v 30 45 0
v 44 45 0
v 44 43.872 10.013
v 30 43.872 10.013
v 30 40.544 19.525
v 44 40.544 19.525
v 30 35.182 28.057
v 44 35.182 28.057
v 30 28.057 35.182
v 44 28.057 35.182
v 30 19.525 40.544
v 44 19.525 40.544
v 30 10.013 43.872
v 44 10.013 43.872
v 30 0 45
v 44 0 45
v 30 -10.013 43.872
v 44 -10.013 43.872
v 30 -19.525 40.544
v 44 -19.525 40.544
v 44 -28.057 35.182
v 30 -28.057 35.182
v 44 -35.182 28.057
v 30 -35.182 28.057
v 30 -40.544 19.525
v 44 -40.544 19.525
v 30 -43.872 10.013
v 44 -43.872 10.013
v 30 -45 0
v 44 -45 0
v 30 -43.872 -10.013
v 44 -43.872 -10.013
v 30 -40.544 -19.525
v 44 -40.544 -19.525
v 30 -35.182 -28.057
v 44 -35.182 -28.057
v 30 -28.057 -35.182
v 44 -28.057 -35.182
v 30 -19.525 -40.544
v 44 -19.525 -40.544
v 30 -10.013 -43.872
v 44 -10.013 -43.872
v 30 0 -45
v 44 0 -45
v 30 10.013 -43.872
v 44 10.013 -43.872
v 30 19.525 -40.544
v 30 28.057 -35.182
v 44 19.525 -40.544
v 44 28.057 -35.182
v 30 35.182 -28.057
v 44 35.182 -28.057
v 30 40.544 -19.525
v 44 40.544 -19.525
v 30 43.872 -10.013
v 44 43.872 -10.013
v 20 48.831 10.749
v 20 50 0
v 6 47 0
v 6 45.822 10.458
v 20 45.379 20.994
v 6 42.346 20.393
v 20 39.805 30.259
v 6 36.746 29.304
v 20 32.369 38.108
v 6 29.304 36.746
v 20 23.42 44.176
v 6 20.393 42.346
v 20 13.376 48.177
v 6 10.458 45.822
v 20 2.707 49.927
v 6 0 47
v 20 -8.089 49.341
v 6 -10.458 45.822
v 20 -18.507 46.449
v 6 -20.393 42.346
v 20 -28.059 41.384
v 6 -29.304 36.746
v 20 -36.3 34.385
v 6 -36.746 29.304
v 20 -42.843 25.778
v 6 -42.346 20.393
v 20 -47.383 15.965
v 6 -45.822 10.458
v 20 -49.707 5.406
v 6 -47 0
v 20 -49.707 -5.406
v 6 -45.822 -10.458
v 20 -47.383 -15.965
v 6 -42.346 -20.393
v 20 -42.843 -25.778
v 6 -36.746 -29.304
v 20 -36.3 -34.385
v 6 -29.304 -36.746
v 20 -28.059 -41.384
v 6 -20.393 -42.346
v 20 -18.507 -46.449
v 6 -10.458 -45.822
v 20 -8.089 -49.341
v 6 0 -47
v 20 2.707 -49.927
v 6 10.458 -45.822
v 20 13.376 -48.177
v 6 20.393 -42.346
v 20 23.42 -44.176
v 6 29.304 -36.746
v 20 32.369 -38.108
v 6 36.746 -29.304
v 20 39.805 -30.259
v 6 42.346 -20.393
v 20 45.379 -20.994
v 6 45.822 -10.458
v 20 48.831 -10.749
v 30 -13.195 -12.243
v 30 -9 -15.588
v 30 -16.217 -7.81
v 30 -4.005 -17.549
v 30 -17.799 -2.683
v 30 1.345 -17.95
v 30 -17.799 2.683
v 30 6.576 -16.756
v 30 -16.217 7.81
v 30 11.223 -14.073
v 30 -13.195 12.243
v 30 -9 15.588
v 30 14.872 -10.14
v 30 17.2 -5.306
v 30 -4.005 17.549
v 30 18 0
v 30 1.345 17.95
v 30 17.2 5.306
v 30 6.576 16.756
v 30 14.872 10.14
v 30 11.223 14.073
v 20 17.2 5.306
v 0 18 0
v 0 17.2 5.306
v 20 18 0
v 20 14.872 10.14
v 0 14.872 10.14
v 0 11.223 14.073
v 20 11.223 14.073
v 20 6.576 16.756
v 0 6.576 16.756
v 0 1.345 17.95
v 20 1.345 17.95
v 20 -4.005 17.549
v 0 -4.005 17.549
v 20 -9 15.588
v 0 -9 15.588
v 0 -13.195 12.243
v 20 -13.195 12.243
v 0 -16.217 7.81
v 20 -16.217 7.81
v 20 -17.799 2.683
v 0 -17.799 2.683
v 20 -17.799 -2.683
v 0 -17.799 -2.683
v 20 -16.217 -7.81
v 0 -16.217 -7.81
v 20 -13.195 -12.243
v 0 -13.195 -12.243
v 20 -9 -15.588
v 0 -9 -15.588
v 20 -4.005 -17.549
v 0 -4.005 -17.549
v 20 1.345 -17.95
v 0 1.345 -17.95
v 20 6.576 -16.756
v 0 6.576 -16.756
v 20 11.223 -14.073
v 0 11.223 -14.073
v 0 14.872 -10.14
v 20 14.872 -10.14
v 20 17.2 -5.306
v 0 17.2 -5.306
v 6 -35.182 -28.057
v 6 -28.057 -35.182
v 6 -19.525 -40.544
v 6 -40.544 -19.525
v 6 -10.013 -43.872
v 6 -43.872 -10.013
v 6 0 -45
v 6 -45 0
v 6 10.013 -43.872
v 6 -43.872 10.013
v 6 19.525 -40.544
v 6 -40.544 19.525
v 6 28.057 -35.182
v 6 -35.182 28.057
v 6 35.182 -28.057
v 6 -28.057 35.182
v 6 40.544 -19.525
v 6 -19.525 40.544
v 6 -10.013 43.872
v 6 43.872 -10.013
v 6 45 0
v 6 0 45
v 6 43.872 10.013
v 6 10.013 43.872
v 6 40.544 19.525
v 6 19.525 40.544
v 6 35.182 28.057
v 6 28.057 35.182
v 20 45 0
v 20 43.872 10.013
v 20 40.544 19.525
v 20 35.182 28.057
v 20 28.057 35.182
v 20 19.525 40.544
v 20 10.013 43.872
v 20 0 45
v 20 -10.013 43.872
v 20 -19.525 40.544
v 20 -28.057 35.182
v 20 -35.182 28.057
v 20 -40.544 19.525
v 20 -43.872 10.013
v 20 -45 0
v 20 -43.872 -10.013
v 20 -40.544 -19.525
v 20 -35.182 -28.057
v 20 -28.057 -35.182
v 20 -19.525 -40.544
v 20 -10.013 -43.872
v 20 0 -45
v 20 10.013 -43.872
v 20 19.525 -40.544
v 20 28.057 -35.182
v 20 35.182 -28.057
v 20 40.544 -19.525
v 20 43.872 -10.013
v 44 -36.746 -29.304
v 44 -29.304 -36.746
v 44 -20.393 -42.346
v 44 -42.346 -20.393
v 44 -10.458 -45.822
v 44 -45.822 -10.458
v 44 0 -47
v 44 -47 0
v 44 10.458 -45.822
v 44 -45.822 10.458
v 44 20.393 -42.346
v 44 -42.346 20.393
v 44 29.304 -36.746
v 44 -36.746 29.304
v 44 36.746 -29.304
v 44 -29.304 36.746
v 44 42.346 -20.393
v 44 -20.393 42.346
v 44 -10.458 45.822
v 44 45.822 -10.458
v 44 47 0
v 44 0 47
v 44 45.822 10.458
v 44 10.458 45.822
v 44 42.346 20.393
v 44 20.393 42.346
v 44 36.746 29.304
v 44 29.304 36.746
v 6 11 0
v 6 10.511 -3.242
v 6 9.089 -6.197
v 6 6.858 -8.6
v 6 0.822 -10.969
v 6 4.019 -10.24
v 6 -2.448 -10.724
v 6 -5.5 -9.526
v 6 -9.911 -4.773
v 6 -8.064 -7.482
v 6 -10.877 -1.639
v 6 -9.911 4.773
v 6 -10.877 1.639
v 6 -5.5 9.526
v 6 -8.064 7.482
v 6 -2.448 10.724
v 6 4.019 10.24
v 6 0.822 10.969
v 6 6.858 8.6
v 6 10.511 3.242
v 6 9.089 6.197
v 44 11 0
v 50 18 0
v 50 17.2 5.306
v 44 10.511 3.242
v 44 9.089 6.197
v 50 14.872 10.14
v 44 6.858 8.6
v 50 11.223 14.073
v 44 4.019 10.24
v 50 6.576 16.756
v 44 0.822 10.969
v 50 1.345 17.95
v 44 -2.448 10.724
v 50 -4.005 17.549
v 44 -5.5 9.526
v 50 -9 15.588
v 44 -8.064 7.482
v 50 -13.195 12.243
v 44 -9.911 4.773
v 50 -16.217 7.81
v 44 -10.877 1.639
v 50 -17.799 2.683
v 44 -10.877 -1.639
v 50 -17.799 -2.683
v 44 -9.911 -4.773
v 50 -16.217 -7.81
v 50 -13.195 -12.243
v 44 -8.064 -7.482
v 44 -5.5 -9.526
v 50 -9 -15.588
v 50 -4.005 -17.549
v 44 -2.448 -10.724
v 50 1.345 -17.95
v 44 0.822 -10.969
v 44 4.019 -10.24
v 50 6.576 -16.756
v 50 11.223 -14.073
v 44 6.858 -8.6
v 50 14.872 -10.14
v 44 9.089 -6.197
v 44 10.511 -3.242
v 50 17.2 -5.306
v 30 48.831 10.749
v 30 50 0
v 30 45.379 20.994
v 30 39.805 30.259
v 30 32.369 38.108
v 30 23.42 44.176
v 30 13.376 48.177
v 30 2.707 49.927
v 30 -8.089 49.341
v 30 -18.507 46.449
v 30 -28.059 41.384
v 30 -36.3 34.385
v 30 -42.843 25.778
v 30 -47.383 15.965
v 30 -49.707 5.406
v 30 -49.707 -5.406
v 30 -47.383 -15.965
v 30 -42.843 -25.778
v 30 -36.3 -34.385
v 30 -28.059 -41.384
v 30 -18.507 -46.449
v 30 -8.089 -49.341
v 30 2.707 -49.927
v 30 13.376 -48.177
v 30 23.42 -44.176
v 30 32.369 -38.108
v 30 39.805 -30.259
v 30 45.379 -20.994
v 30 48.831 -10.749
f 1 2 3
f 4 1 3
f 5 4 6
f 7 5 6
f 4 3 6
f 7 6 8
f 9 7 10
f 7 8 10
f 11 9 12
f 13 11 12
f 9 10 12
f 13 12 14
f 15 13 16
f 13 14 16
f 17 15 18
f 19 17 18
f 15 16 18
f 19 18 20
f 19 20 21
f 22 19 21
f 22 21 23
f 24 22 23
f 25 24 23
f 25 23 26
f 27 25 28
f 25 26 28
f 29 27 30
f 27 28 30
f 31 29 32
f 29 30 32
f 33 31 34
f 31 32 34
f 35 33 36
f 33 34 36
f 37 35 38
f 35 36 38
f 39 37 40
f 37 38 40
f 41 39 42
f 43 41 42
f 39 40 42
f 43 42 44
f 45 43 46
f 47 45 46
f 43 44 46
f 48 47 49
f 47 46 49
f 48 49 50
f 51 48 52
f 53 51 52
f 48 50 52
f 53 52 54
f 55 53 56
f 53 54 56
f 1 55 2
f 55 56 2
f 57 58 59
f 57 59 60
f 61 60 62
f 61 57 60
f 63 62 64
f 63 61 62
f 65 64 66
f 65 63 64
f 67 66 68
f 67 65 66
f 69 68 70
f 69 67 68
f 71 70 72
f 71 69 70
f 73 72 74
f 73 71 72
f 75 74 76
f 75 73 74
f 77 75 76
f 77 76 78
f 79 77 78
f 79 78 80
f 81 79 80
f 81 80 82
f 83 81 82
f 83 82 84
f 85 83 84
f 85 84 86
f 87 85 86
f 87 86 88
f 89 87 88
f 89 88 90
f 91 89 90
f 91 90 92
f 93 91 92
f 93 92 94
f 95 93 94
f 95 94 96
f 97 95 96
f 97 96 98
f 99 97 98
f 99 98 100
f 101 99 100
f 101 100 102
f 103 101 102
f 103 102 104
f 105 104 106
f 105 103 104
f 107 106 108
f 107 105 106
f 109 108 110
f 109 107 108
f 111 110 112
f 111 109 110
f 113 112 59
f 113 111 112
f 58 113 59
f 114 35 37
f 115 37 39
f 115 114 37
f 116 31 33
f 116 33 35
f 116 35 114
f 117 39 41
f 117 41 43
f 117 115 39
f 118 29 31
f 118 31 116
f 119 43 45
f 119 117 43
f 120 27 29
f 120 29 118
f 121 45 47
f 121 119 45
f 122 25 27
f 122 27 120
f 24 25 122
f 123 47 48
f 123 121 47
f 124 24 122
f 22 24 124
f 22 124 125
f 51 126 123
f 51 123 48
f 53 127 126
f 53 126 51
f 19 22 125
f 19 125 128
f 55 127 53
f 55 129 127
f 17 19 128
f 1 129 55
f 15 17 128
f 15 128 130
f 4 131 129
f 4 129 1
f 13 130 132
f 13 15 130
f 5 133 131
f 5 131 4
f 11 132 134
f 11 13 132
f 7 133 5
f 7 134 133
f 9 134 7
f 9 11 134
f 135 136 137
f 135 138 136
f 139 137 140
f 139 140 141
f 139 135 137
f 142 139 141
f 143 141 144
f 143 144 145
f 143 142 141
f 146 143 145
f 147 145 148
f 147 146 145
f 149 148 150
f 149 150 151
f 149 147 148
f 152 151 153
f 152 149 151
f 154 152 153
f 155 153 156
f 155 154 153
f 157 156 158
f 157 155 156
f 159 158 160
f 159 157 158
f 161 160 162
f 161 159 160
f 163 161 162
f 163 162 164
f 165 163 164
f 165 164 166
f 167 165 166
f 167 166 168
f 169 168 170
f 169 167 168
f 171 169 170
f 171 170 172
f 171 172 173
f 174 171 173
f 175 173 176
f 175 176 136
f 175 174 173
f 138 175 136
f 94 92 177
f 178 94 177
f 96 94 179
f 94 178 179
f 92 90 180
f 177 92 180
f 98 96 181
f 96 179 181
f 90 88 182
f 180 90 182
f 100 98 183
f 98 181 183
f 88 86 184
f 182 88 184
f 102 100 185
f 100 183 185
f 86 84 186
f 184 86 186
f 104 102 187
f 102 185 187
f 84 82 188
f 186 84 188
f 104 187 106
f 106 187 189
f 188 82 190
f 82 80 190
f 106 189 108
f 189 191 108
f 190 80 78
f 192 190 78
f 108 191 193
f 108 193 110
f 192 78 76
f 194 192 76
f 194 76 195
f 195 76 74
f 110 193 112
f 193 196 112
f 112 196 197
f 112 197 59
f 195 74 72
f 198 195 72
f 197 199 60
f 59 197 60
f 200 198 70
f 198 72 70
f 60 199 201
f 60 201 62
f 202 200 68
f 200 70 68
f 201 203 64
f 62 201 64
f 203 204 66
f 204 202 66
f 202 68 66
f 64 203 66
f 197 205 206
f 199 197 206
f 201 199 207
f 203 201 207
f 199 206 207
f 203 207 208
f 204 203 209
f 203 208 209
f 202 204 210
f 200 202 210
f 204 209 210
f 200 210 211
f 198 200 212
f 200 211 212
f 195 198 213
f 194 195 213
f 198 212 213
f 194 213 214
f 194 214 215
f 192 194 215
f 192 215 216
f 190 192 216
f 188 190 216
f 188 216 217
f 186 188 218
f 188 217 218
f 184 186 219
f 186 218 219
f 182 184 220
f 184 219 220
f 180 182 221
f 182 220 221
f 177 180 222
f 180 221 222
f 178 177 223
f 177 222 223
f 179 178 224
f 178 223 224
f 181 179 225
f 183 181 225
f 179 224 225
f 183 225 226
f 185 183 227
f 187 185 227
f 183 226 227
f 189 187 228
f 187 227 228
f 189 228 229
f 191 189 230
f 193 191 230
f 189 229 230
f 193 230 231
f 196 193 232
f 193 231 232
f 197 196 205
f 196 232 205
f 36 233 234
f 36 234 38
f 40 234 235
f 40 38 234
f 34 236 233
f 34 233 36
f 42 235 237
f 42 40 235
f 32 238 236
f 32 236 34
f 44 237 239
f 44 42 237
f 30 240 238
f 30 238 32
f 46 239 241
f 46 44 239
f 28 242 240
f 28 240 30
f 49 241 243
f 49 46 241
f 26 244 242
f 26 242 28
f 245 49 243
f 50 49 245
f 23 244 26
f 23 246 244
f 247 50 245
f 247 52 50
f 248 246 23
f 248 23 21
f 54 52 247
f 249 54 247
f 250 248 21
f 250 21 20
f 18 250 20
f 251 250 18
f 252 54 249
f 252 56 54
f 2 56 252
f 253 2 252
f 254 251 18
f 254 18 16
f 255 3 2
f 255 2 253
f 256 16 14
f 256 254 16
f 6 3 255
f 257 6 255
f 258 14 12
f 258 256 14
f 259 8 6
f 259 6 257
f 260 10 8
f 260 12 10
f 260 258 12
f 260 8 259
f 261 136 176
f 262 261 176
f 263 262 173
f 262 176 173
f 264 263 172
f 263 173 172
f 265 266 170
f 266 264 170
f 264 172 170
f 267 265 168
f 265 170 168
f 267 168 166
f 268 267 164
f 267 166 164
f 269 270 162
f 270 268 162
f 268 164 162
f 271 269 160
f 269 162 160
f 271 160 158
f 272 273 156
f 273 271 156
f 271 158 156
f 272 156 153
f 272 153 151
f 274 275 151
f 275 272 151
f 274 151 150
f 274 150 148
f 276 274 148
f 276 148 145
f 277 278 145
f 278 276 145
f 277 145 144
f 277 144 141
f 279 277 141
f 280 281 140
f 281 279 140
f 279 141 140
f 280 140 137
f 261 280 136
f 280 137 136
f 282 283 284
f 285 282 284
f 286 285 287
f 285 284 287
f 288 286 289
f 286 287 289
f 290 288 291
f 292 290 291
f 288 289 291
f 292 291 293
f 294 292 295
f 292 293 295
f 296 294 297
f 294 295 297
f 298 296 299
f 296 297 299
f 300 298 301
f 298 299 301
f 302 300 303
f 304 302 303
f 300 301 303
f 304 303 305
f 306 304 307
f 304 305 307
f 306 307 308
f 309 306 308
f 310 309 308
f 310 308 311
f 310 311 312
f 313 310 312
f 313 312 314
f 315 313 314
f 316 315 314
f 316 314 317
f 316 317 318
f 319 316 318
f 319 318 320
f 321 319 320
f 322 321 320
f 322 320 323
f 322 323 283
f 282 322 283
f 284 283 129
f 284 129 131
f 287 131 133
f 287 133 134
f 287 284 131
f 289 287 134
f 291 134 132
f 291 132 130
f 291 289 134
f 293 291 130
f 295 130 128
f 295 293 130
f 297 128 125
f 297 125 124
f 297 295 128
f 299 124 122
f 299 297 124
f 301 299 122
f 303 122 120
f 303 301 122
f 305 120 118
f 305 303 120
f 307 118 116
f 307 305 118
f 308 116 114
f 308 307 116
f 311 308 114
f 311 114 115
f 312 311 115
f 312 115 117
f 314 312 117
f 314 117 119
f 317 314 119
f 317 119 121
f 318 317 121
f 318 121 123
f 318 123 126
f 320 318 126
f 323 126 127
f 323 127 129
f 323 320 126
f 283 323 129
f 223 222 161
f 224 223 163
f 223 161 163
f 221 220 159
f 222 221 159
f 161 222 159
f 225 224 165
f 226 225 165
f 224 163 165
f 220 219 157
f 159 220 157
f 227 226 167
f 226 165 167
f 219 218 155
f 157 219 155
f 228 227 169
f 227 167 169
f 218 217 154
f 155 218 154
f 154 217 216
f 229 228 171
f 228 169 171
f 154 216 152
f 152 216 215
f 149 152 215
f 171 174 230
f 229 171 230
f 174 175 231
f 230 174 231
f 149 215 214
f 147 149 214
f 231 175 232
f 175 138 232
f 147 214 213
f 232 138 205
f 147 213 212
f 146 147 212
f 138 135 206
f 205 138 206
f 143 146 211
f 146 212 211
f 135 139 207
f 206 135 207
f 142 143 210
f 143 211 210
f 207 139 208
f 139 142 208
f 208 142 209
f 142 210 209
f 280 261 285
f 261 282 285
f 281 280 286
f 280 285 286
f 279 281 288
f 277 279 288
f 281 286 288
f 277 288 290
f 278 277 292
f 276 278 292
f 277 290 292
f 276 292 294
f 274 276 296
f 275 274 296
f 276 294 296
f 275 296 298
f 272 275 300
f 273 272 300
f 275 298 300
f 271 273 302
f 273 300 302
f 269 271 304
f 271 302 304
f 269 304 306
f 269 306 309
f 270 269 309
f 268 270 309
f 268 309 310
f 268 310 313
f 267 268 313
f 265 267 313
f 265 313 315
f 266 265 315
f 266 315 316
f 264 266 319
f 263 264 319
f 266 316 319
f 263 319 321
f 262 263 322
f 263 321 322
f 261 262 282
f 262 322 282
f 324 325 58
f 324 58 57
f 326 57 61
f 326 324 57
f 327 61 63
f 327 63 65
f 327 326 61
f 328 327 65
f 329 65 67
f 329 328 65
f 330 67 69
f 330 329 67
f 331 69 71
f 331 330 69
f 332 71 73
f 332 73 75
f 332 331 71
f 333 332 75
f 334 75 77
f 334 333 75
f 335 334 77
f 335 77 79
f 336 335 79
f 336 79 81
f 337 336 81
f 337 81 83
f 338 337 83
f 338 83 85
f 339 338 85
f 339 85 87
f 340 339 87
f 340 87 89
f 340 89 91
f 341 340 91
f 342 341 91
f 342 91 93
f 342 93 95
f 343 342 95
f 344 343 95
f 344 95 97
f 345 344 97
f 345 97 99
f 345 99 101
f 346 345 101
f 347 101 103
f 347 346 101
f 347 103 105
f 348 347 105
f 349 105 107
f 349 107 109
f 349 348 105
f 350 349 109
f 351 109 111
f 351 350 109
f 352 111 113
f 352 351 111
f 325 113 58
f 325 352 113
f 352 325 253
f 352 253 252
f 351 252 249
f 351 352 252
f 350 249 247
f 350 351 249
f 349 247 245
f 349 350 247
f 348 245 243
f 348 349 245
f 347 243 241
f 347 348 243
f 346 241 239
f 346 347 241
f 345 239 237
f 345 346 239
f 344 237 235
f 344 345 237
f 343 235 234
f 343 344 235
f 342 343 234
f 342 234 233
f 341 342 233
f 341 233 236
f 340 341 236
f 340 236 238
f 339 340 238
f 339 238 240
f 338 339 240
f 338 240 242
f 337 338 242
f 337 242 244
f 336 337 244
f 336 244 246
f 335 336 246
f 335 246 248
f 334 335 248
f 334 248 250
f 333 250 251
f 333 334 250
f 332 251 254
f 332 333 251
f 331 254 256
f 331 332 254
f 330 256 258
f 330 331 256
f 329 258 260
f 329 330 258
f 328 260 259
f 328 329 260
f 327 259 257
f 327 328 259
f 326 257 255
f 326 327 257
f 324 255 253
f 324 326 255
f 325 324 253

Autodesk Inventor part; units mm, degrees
ref_plane "YZ Plane" through (0, 0, 0) normal (1, 0, 0) x (0, 1, 0)
ref_plane "XZ Plane" through (0, 0, 0) normal (0, 1, 0) x (-1, 0, 0)
ref_plane "XY Plane" through (0, 0, 0) normal (0, 0, 1) x (1, 0, 0)
sketch "Sketch1" plane through (0, 0, 0) normal (0, 0, 1) x (1, 0, 0)
  line L0 (0, 0) -> (50, 0)
  line L1 (6, 11) -> (44, 11)
  line L2 (20, 50) -> (30, 50)
  line L3 (20, 18) -> (20, 45)
  line L4 (30, 18) -> (30, 45)
  line L5 (0, 18) -> (20, 18)
  line L6 (30, 18) -> (50, 18)
  line L7 (44, 45) -> (44, 47)
  line L8 (6, 45) -> (6, 47)
  line L9 (44, 47) -> (30, 50)
  line L10 (20, 50) -> (6, 47)
  line L11 (6, 45) -> (20, 45)
  line L12 (30, 45) -> (44, 45)
  line L13 (50, 18) -> (44, 11)
  line L14 (6, 11) -> (0, 18)
  dimension "d0" = 50
  dimension "d2" = 38
  dimension "d3" = 11
  dimension "d4" = 39
  dimension "d8" = 10
  dimension "d9" = 20
  dimension "d12" = 2
  dimension "d13" = 2
  dimension "d14" = 18
  dimension "d15" = 26.2486
  dimension "d16" = 11.7142
  dimension "d17" = 18
  dimension "d18" = 45
revolve "Revolution1" add sketch "Sketch1" angle 360 about axis through (0, 0, 0) along (1, 0, 0)
properties part number "wheel" material "Iron, Malleable"
